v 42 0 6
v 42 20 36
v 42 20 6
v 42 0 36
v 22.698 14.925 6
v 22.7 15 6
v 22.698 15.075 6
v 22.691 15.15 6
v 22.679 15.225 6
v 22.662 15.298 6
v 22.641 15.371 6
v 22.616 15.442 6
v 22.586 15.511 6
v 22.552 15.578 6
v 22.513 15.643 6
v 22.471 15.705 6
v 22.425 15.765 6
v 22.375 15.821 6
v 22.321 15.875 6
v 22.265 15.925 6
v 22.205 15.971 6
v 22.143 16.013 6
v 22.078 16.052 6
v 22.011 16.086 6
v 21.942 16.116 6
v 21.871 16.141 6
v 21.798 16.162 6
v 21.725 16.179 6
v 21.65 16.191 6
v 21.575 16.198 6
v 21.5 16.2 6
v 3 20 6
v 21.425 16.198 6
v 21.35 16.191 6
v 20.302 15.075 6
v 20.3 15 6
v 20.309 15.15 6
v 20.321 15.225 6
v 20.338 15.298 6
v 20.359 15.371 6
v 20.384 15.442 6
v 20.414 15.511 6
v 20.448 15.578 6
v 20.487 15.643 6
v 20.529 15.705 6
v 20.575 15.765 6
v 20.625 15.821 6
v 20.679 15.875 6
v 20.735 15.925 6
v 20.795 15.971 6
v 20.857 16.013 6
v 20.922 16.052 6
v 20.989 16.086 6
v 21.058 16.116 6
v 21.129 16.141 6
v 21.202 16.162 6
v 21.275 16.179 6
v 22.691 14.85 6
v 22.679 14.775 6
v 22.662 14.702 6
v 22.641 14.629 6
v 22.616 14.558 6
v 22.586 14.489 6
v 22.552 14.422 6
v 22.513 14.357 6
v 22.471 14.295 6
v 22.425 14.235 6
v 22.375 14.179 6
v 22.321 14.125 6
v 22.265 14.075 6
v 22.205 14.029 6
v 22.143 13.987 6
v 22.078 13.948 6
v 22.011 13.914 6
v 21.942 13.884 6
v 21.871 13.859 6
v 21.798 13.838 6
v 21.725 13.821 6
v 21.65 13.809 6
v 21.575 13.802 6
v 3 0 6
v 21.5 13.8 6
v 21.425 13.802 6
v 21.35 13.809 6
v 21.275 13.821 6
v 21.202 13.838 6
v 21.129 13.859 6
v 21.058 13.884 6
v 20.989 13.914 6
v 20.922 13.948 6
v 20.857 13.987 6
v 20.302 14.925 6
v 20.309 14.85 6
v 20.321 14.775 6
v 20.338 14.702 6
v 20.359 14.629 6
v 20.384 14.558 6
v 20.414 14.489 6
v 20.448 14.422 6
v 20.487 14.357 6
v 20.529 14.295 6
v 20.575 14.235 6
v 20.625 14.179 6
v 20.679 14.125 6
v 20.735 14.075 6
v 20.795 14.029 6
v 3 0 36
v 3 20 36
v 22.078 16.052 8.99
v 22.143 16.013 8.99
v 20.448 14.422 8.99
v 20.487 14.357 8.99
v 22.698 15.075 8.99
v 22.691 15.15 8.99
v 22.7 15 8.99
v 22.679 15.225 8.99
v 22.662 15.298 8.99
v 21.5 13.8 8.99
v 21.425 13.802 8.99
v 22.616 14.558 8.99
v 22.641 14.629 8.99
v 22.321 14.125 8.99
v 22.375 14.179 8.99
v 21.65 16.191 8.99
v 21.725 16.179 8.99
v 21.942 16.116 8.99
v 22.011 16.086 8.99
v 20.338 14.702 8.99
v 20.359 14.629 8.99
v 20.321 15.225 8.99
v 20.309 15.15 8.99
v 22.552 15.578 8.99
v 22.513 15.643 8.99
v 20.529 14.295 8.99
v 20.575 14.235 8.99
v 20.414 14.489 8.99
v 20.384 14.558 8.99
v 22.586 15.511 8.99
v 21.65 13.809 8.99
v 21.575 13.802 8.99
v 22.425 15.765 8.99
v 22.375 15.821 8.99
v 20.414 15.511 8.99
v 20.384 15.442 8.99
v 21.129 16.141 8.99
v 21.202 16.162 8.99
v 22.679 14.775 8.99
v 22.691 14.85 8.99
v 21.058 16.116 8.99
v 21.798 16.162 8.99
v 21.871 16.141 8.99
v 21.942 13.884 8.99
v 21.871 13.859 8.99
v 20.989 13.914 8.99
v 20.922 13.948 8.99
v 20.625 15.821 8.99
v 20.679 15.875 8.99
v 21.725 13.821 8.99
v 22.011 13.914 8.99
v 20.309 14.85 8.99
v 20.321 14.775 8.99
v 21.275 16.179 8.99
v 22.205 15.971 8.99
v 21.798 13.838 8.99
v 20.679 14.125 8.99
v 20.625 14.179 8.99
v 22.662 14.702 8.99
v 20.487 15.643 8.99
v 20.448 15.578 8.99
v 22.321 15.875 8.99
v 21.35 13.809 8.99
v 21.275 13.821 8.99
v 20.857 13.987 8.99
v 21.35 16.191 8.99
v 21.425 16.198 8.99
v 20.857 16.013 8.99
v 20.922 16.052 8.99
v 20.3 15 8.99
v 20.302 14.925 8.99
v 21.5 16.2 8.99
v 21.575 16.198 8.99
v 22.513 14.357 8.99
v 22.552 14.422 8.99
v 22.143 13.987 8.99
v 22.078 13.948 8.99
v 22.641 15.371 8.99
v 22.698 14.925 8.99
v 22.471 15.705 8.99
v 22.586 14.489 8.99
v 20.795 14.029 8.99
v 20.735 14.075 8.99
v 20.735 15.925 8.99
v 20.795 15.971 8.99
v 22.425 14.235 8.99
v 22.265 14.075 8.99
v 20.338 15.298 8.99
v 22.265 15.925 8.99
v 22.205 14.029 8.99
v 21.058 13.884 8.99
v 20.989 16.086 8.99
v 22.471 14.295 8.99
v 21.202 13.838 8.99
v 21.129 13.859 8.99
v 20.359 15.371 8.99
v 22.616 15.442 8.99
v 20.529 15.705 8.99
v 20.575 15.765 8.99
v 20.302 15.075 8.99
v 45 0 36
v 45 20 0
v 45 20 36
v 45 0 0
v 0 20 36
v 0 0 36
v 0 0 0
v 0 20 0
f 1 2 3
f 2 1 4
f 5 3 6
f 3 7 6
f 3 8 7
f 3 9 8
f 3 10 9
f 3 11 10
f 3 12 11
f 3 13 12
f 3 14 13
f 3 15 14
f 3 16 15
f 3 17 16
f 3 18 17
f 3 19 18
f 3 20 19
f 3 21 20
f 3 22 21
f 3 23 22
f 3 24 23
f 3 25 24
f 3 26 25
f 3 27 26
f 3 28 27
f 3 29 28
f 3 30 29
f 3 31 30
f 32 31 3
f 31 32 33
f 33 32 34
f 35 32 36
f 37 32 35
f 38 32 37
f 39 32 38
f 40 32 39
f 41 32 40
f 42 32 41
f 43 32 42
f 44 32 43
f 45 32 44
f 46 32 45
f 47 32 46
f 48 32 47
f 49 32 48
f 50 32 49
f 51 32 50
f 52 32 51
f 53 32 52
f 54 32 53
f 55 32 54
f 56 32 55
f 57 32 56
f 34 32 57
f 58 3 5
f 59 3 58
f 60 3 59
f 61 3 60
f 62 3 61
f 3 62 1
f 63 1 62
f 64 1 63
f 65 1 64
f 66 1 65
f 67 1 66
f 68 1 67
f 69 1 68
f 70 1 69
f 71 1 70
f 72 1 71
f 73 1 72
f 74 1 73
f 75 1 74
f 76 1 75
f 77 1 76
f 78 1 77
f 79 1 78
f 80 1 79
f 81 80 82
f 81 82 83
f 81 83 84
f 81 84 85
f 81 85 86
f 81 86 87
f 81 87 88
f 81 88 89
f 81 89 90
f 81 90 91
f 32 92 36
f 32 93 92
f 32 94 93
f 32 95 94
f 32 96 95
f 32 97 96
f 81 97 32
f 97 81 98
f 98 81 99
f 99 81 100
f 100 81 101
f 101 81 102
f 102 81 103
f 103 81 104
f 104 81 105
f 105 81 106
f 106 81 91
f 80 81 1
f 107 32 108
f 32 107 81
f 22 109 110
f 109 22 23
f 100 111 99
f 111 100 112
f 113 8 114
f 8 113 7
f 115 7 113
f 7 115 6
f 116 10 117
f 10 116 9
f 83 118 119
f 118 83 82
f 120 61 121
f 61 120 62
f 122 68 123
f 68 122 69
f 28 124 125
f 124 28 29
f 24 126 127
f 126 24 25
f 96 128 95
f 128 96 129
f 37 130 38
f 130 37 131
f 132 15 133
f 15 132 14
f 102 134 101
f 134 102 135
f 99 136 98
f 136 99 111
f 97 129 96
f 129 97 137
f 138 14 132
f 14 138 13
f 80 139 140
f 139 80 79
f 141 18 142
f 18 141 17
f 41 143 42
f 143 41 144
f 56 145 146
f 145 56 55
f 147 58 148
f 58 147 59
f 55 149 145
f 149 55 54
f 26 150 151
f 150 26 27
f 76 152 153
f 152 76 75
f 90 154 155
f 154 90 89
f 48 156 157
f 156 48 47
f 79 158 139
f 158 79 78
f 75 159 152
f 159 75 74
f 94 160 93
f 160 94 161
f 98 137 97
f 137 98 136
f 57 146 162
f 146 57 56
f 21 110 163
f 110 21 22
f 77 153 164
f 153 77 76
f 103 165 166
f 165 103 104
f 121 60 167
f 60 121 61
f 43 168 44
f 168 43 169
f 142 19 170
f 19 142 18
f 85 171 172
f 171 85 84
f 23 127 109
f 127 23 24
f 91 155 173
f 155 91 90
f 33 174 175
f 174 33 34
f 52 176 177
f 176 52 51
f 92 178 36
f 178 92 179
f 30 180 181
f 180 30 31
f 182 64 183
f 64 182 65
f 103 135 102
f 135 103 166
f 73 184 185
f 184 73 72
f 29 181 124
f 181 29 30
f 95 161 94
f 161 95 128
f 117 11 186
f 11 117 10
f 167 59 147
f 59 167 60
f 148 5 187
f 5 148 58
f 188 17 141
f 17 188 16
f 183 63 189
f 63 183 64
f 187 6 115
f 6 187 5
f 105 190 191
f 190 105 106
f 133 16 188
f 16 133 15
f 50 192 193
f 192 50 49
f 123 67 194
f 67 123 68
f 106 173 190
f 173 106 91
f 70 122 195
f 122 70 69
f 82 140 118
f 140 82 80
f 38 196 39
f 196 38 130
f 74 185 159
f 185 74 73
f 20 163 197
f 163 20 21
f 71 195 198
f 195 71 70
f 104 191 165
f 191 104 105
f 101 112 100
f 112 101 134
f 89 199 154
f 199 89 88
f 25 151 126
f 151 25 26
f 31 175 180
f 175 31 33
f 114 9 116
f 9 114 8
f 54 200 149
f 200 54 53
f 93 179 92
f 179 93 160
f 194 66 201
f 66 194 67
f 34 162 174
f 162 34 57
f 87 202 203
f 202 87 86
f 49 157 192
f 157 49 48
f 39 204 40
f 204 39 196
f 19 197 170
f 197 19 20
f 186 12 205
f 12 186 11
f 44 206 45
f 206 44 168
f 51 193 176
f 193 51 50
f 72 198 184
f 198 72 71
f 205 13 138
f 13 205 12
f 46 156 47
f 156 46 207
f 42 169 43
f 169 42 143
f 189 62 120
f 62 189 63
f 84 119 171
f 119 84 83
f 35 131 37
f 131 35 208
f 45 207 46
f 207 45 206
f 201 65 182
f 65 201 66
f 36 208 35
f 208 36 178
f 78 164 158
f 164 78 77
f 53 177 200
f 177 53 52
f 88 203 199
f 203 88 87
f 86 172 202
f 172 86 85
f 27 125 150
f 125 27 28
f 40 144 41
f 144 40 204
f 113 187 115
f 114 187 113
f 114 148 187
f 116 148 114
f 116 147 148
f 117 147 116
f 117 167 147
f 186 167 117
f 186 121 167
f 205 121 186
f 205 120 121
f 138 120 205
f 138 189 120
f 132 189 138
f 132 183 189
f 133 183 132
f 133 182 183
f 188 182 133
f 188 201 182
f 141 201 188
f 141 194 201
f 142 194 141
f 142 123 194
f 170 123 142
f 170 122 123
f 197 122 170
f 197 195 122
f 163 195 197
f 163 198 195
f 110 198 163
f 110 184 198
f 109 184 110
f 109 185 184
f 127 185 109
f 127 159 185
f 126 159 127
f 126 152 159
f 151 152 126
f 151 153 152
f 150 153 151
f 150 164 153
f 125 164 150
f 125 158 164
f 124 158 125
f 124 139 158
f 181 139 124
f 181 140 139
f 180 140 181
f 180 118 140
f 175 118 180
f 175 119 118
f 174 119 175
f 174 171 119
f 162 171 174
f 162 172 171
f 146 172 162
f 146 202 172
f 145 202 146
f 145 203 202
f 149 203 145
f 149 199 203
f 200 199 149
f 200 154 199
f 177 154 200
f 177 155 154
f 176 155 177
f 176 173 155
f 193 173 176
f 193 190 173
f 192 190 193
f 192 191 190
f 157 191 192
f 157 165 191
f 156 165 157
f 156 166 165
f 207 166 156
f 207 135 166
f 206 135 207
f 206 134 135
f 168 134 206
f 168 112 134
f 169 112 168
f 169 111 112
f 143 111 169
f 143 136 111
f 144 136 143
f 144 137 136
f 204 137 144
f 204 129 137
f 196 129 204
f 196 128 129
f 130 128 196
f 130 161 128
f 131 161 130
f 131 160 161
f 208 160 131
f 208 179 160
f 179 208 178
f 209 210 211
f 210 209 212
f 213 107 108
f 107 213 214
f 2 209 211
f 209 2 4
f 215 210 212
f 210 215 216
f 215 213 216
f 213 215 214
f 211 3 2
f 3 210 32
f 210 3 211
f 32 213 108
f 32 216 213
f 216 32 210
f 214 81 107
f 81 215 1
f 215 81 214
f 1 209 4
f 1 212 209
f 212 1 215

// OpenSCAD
$fn = 100;

width = 39;
height = 30;
nupsi_off = 21.5;
nupsi_r = 1.2;

with_end = false;

difference(){
	cube([width + 6, 20, height + 6]);
	difference() {
		translate([3, -0.01, 6]) cube([width, 20.02, height + 0.01]);
		translate([nupsi_off, 15, 6-0.01]) cylinder(r1=nupsi_r, r2=nupsi_r,h=3);
	}
}

if (with_end) {
	translate([0, -12, 0]) union(){
		difference() {
			cube([width + 6, 12.01, height + 6]);
			translate([3, -0.01, 6]) cube([width, 20.02, height + 0.01]);
		}
		cube([12 + 3, 10, 50]);
	}
}
